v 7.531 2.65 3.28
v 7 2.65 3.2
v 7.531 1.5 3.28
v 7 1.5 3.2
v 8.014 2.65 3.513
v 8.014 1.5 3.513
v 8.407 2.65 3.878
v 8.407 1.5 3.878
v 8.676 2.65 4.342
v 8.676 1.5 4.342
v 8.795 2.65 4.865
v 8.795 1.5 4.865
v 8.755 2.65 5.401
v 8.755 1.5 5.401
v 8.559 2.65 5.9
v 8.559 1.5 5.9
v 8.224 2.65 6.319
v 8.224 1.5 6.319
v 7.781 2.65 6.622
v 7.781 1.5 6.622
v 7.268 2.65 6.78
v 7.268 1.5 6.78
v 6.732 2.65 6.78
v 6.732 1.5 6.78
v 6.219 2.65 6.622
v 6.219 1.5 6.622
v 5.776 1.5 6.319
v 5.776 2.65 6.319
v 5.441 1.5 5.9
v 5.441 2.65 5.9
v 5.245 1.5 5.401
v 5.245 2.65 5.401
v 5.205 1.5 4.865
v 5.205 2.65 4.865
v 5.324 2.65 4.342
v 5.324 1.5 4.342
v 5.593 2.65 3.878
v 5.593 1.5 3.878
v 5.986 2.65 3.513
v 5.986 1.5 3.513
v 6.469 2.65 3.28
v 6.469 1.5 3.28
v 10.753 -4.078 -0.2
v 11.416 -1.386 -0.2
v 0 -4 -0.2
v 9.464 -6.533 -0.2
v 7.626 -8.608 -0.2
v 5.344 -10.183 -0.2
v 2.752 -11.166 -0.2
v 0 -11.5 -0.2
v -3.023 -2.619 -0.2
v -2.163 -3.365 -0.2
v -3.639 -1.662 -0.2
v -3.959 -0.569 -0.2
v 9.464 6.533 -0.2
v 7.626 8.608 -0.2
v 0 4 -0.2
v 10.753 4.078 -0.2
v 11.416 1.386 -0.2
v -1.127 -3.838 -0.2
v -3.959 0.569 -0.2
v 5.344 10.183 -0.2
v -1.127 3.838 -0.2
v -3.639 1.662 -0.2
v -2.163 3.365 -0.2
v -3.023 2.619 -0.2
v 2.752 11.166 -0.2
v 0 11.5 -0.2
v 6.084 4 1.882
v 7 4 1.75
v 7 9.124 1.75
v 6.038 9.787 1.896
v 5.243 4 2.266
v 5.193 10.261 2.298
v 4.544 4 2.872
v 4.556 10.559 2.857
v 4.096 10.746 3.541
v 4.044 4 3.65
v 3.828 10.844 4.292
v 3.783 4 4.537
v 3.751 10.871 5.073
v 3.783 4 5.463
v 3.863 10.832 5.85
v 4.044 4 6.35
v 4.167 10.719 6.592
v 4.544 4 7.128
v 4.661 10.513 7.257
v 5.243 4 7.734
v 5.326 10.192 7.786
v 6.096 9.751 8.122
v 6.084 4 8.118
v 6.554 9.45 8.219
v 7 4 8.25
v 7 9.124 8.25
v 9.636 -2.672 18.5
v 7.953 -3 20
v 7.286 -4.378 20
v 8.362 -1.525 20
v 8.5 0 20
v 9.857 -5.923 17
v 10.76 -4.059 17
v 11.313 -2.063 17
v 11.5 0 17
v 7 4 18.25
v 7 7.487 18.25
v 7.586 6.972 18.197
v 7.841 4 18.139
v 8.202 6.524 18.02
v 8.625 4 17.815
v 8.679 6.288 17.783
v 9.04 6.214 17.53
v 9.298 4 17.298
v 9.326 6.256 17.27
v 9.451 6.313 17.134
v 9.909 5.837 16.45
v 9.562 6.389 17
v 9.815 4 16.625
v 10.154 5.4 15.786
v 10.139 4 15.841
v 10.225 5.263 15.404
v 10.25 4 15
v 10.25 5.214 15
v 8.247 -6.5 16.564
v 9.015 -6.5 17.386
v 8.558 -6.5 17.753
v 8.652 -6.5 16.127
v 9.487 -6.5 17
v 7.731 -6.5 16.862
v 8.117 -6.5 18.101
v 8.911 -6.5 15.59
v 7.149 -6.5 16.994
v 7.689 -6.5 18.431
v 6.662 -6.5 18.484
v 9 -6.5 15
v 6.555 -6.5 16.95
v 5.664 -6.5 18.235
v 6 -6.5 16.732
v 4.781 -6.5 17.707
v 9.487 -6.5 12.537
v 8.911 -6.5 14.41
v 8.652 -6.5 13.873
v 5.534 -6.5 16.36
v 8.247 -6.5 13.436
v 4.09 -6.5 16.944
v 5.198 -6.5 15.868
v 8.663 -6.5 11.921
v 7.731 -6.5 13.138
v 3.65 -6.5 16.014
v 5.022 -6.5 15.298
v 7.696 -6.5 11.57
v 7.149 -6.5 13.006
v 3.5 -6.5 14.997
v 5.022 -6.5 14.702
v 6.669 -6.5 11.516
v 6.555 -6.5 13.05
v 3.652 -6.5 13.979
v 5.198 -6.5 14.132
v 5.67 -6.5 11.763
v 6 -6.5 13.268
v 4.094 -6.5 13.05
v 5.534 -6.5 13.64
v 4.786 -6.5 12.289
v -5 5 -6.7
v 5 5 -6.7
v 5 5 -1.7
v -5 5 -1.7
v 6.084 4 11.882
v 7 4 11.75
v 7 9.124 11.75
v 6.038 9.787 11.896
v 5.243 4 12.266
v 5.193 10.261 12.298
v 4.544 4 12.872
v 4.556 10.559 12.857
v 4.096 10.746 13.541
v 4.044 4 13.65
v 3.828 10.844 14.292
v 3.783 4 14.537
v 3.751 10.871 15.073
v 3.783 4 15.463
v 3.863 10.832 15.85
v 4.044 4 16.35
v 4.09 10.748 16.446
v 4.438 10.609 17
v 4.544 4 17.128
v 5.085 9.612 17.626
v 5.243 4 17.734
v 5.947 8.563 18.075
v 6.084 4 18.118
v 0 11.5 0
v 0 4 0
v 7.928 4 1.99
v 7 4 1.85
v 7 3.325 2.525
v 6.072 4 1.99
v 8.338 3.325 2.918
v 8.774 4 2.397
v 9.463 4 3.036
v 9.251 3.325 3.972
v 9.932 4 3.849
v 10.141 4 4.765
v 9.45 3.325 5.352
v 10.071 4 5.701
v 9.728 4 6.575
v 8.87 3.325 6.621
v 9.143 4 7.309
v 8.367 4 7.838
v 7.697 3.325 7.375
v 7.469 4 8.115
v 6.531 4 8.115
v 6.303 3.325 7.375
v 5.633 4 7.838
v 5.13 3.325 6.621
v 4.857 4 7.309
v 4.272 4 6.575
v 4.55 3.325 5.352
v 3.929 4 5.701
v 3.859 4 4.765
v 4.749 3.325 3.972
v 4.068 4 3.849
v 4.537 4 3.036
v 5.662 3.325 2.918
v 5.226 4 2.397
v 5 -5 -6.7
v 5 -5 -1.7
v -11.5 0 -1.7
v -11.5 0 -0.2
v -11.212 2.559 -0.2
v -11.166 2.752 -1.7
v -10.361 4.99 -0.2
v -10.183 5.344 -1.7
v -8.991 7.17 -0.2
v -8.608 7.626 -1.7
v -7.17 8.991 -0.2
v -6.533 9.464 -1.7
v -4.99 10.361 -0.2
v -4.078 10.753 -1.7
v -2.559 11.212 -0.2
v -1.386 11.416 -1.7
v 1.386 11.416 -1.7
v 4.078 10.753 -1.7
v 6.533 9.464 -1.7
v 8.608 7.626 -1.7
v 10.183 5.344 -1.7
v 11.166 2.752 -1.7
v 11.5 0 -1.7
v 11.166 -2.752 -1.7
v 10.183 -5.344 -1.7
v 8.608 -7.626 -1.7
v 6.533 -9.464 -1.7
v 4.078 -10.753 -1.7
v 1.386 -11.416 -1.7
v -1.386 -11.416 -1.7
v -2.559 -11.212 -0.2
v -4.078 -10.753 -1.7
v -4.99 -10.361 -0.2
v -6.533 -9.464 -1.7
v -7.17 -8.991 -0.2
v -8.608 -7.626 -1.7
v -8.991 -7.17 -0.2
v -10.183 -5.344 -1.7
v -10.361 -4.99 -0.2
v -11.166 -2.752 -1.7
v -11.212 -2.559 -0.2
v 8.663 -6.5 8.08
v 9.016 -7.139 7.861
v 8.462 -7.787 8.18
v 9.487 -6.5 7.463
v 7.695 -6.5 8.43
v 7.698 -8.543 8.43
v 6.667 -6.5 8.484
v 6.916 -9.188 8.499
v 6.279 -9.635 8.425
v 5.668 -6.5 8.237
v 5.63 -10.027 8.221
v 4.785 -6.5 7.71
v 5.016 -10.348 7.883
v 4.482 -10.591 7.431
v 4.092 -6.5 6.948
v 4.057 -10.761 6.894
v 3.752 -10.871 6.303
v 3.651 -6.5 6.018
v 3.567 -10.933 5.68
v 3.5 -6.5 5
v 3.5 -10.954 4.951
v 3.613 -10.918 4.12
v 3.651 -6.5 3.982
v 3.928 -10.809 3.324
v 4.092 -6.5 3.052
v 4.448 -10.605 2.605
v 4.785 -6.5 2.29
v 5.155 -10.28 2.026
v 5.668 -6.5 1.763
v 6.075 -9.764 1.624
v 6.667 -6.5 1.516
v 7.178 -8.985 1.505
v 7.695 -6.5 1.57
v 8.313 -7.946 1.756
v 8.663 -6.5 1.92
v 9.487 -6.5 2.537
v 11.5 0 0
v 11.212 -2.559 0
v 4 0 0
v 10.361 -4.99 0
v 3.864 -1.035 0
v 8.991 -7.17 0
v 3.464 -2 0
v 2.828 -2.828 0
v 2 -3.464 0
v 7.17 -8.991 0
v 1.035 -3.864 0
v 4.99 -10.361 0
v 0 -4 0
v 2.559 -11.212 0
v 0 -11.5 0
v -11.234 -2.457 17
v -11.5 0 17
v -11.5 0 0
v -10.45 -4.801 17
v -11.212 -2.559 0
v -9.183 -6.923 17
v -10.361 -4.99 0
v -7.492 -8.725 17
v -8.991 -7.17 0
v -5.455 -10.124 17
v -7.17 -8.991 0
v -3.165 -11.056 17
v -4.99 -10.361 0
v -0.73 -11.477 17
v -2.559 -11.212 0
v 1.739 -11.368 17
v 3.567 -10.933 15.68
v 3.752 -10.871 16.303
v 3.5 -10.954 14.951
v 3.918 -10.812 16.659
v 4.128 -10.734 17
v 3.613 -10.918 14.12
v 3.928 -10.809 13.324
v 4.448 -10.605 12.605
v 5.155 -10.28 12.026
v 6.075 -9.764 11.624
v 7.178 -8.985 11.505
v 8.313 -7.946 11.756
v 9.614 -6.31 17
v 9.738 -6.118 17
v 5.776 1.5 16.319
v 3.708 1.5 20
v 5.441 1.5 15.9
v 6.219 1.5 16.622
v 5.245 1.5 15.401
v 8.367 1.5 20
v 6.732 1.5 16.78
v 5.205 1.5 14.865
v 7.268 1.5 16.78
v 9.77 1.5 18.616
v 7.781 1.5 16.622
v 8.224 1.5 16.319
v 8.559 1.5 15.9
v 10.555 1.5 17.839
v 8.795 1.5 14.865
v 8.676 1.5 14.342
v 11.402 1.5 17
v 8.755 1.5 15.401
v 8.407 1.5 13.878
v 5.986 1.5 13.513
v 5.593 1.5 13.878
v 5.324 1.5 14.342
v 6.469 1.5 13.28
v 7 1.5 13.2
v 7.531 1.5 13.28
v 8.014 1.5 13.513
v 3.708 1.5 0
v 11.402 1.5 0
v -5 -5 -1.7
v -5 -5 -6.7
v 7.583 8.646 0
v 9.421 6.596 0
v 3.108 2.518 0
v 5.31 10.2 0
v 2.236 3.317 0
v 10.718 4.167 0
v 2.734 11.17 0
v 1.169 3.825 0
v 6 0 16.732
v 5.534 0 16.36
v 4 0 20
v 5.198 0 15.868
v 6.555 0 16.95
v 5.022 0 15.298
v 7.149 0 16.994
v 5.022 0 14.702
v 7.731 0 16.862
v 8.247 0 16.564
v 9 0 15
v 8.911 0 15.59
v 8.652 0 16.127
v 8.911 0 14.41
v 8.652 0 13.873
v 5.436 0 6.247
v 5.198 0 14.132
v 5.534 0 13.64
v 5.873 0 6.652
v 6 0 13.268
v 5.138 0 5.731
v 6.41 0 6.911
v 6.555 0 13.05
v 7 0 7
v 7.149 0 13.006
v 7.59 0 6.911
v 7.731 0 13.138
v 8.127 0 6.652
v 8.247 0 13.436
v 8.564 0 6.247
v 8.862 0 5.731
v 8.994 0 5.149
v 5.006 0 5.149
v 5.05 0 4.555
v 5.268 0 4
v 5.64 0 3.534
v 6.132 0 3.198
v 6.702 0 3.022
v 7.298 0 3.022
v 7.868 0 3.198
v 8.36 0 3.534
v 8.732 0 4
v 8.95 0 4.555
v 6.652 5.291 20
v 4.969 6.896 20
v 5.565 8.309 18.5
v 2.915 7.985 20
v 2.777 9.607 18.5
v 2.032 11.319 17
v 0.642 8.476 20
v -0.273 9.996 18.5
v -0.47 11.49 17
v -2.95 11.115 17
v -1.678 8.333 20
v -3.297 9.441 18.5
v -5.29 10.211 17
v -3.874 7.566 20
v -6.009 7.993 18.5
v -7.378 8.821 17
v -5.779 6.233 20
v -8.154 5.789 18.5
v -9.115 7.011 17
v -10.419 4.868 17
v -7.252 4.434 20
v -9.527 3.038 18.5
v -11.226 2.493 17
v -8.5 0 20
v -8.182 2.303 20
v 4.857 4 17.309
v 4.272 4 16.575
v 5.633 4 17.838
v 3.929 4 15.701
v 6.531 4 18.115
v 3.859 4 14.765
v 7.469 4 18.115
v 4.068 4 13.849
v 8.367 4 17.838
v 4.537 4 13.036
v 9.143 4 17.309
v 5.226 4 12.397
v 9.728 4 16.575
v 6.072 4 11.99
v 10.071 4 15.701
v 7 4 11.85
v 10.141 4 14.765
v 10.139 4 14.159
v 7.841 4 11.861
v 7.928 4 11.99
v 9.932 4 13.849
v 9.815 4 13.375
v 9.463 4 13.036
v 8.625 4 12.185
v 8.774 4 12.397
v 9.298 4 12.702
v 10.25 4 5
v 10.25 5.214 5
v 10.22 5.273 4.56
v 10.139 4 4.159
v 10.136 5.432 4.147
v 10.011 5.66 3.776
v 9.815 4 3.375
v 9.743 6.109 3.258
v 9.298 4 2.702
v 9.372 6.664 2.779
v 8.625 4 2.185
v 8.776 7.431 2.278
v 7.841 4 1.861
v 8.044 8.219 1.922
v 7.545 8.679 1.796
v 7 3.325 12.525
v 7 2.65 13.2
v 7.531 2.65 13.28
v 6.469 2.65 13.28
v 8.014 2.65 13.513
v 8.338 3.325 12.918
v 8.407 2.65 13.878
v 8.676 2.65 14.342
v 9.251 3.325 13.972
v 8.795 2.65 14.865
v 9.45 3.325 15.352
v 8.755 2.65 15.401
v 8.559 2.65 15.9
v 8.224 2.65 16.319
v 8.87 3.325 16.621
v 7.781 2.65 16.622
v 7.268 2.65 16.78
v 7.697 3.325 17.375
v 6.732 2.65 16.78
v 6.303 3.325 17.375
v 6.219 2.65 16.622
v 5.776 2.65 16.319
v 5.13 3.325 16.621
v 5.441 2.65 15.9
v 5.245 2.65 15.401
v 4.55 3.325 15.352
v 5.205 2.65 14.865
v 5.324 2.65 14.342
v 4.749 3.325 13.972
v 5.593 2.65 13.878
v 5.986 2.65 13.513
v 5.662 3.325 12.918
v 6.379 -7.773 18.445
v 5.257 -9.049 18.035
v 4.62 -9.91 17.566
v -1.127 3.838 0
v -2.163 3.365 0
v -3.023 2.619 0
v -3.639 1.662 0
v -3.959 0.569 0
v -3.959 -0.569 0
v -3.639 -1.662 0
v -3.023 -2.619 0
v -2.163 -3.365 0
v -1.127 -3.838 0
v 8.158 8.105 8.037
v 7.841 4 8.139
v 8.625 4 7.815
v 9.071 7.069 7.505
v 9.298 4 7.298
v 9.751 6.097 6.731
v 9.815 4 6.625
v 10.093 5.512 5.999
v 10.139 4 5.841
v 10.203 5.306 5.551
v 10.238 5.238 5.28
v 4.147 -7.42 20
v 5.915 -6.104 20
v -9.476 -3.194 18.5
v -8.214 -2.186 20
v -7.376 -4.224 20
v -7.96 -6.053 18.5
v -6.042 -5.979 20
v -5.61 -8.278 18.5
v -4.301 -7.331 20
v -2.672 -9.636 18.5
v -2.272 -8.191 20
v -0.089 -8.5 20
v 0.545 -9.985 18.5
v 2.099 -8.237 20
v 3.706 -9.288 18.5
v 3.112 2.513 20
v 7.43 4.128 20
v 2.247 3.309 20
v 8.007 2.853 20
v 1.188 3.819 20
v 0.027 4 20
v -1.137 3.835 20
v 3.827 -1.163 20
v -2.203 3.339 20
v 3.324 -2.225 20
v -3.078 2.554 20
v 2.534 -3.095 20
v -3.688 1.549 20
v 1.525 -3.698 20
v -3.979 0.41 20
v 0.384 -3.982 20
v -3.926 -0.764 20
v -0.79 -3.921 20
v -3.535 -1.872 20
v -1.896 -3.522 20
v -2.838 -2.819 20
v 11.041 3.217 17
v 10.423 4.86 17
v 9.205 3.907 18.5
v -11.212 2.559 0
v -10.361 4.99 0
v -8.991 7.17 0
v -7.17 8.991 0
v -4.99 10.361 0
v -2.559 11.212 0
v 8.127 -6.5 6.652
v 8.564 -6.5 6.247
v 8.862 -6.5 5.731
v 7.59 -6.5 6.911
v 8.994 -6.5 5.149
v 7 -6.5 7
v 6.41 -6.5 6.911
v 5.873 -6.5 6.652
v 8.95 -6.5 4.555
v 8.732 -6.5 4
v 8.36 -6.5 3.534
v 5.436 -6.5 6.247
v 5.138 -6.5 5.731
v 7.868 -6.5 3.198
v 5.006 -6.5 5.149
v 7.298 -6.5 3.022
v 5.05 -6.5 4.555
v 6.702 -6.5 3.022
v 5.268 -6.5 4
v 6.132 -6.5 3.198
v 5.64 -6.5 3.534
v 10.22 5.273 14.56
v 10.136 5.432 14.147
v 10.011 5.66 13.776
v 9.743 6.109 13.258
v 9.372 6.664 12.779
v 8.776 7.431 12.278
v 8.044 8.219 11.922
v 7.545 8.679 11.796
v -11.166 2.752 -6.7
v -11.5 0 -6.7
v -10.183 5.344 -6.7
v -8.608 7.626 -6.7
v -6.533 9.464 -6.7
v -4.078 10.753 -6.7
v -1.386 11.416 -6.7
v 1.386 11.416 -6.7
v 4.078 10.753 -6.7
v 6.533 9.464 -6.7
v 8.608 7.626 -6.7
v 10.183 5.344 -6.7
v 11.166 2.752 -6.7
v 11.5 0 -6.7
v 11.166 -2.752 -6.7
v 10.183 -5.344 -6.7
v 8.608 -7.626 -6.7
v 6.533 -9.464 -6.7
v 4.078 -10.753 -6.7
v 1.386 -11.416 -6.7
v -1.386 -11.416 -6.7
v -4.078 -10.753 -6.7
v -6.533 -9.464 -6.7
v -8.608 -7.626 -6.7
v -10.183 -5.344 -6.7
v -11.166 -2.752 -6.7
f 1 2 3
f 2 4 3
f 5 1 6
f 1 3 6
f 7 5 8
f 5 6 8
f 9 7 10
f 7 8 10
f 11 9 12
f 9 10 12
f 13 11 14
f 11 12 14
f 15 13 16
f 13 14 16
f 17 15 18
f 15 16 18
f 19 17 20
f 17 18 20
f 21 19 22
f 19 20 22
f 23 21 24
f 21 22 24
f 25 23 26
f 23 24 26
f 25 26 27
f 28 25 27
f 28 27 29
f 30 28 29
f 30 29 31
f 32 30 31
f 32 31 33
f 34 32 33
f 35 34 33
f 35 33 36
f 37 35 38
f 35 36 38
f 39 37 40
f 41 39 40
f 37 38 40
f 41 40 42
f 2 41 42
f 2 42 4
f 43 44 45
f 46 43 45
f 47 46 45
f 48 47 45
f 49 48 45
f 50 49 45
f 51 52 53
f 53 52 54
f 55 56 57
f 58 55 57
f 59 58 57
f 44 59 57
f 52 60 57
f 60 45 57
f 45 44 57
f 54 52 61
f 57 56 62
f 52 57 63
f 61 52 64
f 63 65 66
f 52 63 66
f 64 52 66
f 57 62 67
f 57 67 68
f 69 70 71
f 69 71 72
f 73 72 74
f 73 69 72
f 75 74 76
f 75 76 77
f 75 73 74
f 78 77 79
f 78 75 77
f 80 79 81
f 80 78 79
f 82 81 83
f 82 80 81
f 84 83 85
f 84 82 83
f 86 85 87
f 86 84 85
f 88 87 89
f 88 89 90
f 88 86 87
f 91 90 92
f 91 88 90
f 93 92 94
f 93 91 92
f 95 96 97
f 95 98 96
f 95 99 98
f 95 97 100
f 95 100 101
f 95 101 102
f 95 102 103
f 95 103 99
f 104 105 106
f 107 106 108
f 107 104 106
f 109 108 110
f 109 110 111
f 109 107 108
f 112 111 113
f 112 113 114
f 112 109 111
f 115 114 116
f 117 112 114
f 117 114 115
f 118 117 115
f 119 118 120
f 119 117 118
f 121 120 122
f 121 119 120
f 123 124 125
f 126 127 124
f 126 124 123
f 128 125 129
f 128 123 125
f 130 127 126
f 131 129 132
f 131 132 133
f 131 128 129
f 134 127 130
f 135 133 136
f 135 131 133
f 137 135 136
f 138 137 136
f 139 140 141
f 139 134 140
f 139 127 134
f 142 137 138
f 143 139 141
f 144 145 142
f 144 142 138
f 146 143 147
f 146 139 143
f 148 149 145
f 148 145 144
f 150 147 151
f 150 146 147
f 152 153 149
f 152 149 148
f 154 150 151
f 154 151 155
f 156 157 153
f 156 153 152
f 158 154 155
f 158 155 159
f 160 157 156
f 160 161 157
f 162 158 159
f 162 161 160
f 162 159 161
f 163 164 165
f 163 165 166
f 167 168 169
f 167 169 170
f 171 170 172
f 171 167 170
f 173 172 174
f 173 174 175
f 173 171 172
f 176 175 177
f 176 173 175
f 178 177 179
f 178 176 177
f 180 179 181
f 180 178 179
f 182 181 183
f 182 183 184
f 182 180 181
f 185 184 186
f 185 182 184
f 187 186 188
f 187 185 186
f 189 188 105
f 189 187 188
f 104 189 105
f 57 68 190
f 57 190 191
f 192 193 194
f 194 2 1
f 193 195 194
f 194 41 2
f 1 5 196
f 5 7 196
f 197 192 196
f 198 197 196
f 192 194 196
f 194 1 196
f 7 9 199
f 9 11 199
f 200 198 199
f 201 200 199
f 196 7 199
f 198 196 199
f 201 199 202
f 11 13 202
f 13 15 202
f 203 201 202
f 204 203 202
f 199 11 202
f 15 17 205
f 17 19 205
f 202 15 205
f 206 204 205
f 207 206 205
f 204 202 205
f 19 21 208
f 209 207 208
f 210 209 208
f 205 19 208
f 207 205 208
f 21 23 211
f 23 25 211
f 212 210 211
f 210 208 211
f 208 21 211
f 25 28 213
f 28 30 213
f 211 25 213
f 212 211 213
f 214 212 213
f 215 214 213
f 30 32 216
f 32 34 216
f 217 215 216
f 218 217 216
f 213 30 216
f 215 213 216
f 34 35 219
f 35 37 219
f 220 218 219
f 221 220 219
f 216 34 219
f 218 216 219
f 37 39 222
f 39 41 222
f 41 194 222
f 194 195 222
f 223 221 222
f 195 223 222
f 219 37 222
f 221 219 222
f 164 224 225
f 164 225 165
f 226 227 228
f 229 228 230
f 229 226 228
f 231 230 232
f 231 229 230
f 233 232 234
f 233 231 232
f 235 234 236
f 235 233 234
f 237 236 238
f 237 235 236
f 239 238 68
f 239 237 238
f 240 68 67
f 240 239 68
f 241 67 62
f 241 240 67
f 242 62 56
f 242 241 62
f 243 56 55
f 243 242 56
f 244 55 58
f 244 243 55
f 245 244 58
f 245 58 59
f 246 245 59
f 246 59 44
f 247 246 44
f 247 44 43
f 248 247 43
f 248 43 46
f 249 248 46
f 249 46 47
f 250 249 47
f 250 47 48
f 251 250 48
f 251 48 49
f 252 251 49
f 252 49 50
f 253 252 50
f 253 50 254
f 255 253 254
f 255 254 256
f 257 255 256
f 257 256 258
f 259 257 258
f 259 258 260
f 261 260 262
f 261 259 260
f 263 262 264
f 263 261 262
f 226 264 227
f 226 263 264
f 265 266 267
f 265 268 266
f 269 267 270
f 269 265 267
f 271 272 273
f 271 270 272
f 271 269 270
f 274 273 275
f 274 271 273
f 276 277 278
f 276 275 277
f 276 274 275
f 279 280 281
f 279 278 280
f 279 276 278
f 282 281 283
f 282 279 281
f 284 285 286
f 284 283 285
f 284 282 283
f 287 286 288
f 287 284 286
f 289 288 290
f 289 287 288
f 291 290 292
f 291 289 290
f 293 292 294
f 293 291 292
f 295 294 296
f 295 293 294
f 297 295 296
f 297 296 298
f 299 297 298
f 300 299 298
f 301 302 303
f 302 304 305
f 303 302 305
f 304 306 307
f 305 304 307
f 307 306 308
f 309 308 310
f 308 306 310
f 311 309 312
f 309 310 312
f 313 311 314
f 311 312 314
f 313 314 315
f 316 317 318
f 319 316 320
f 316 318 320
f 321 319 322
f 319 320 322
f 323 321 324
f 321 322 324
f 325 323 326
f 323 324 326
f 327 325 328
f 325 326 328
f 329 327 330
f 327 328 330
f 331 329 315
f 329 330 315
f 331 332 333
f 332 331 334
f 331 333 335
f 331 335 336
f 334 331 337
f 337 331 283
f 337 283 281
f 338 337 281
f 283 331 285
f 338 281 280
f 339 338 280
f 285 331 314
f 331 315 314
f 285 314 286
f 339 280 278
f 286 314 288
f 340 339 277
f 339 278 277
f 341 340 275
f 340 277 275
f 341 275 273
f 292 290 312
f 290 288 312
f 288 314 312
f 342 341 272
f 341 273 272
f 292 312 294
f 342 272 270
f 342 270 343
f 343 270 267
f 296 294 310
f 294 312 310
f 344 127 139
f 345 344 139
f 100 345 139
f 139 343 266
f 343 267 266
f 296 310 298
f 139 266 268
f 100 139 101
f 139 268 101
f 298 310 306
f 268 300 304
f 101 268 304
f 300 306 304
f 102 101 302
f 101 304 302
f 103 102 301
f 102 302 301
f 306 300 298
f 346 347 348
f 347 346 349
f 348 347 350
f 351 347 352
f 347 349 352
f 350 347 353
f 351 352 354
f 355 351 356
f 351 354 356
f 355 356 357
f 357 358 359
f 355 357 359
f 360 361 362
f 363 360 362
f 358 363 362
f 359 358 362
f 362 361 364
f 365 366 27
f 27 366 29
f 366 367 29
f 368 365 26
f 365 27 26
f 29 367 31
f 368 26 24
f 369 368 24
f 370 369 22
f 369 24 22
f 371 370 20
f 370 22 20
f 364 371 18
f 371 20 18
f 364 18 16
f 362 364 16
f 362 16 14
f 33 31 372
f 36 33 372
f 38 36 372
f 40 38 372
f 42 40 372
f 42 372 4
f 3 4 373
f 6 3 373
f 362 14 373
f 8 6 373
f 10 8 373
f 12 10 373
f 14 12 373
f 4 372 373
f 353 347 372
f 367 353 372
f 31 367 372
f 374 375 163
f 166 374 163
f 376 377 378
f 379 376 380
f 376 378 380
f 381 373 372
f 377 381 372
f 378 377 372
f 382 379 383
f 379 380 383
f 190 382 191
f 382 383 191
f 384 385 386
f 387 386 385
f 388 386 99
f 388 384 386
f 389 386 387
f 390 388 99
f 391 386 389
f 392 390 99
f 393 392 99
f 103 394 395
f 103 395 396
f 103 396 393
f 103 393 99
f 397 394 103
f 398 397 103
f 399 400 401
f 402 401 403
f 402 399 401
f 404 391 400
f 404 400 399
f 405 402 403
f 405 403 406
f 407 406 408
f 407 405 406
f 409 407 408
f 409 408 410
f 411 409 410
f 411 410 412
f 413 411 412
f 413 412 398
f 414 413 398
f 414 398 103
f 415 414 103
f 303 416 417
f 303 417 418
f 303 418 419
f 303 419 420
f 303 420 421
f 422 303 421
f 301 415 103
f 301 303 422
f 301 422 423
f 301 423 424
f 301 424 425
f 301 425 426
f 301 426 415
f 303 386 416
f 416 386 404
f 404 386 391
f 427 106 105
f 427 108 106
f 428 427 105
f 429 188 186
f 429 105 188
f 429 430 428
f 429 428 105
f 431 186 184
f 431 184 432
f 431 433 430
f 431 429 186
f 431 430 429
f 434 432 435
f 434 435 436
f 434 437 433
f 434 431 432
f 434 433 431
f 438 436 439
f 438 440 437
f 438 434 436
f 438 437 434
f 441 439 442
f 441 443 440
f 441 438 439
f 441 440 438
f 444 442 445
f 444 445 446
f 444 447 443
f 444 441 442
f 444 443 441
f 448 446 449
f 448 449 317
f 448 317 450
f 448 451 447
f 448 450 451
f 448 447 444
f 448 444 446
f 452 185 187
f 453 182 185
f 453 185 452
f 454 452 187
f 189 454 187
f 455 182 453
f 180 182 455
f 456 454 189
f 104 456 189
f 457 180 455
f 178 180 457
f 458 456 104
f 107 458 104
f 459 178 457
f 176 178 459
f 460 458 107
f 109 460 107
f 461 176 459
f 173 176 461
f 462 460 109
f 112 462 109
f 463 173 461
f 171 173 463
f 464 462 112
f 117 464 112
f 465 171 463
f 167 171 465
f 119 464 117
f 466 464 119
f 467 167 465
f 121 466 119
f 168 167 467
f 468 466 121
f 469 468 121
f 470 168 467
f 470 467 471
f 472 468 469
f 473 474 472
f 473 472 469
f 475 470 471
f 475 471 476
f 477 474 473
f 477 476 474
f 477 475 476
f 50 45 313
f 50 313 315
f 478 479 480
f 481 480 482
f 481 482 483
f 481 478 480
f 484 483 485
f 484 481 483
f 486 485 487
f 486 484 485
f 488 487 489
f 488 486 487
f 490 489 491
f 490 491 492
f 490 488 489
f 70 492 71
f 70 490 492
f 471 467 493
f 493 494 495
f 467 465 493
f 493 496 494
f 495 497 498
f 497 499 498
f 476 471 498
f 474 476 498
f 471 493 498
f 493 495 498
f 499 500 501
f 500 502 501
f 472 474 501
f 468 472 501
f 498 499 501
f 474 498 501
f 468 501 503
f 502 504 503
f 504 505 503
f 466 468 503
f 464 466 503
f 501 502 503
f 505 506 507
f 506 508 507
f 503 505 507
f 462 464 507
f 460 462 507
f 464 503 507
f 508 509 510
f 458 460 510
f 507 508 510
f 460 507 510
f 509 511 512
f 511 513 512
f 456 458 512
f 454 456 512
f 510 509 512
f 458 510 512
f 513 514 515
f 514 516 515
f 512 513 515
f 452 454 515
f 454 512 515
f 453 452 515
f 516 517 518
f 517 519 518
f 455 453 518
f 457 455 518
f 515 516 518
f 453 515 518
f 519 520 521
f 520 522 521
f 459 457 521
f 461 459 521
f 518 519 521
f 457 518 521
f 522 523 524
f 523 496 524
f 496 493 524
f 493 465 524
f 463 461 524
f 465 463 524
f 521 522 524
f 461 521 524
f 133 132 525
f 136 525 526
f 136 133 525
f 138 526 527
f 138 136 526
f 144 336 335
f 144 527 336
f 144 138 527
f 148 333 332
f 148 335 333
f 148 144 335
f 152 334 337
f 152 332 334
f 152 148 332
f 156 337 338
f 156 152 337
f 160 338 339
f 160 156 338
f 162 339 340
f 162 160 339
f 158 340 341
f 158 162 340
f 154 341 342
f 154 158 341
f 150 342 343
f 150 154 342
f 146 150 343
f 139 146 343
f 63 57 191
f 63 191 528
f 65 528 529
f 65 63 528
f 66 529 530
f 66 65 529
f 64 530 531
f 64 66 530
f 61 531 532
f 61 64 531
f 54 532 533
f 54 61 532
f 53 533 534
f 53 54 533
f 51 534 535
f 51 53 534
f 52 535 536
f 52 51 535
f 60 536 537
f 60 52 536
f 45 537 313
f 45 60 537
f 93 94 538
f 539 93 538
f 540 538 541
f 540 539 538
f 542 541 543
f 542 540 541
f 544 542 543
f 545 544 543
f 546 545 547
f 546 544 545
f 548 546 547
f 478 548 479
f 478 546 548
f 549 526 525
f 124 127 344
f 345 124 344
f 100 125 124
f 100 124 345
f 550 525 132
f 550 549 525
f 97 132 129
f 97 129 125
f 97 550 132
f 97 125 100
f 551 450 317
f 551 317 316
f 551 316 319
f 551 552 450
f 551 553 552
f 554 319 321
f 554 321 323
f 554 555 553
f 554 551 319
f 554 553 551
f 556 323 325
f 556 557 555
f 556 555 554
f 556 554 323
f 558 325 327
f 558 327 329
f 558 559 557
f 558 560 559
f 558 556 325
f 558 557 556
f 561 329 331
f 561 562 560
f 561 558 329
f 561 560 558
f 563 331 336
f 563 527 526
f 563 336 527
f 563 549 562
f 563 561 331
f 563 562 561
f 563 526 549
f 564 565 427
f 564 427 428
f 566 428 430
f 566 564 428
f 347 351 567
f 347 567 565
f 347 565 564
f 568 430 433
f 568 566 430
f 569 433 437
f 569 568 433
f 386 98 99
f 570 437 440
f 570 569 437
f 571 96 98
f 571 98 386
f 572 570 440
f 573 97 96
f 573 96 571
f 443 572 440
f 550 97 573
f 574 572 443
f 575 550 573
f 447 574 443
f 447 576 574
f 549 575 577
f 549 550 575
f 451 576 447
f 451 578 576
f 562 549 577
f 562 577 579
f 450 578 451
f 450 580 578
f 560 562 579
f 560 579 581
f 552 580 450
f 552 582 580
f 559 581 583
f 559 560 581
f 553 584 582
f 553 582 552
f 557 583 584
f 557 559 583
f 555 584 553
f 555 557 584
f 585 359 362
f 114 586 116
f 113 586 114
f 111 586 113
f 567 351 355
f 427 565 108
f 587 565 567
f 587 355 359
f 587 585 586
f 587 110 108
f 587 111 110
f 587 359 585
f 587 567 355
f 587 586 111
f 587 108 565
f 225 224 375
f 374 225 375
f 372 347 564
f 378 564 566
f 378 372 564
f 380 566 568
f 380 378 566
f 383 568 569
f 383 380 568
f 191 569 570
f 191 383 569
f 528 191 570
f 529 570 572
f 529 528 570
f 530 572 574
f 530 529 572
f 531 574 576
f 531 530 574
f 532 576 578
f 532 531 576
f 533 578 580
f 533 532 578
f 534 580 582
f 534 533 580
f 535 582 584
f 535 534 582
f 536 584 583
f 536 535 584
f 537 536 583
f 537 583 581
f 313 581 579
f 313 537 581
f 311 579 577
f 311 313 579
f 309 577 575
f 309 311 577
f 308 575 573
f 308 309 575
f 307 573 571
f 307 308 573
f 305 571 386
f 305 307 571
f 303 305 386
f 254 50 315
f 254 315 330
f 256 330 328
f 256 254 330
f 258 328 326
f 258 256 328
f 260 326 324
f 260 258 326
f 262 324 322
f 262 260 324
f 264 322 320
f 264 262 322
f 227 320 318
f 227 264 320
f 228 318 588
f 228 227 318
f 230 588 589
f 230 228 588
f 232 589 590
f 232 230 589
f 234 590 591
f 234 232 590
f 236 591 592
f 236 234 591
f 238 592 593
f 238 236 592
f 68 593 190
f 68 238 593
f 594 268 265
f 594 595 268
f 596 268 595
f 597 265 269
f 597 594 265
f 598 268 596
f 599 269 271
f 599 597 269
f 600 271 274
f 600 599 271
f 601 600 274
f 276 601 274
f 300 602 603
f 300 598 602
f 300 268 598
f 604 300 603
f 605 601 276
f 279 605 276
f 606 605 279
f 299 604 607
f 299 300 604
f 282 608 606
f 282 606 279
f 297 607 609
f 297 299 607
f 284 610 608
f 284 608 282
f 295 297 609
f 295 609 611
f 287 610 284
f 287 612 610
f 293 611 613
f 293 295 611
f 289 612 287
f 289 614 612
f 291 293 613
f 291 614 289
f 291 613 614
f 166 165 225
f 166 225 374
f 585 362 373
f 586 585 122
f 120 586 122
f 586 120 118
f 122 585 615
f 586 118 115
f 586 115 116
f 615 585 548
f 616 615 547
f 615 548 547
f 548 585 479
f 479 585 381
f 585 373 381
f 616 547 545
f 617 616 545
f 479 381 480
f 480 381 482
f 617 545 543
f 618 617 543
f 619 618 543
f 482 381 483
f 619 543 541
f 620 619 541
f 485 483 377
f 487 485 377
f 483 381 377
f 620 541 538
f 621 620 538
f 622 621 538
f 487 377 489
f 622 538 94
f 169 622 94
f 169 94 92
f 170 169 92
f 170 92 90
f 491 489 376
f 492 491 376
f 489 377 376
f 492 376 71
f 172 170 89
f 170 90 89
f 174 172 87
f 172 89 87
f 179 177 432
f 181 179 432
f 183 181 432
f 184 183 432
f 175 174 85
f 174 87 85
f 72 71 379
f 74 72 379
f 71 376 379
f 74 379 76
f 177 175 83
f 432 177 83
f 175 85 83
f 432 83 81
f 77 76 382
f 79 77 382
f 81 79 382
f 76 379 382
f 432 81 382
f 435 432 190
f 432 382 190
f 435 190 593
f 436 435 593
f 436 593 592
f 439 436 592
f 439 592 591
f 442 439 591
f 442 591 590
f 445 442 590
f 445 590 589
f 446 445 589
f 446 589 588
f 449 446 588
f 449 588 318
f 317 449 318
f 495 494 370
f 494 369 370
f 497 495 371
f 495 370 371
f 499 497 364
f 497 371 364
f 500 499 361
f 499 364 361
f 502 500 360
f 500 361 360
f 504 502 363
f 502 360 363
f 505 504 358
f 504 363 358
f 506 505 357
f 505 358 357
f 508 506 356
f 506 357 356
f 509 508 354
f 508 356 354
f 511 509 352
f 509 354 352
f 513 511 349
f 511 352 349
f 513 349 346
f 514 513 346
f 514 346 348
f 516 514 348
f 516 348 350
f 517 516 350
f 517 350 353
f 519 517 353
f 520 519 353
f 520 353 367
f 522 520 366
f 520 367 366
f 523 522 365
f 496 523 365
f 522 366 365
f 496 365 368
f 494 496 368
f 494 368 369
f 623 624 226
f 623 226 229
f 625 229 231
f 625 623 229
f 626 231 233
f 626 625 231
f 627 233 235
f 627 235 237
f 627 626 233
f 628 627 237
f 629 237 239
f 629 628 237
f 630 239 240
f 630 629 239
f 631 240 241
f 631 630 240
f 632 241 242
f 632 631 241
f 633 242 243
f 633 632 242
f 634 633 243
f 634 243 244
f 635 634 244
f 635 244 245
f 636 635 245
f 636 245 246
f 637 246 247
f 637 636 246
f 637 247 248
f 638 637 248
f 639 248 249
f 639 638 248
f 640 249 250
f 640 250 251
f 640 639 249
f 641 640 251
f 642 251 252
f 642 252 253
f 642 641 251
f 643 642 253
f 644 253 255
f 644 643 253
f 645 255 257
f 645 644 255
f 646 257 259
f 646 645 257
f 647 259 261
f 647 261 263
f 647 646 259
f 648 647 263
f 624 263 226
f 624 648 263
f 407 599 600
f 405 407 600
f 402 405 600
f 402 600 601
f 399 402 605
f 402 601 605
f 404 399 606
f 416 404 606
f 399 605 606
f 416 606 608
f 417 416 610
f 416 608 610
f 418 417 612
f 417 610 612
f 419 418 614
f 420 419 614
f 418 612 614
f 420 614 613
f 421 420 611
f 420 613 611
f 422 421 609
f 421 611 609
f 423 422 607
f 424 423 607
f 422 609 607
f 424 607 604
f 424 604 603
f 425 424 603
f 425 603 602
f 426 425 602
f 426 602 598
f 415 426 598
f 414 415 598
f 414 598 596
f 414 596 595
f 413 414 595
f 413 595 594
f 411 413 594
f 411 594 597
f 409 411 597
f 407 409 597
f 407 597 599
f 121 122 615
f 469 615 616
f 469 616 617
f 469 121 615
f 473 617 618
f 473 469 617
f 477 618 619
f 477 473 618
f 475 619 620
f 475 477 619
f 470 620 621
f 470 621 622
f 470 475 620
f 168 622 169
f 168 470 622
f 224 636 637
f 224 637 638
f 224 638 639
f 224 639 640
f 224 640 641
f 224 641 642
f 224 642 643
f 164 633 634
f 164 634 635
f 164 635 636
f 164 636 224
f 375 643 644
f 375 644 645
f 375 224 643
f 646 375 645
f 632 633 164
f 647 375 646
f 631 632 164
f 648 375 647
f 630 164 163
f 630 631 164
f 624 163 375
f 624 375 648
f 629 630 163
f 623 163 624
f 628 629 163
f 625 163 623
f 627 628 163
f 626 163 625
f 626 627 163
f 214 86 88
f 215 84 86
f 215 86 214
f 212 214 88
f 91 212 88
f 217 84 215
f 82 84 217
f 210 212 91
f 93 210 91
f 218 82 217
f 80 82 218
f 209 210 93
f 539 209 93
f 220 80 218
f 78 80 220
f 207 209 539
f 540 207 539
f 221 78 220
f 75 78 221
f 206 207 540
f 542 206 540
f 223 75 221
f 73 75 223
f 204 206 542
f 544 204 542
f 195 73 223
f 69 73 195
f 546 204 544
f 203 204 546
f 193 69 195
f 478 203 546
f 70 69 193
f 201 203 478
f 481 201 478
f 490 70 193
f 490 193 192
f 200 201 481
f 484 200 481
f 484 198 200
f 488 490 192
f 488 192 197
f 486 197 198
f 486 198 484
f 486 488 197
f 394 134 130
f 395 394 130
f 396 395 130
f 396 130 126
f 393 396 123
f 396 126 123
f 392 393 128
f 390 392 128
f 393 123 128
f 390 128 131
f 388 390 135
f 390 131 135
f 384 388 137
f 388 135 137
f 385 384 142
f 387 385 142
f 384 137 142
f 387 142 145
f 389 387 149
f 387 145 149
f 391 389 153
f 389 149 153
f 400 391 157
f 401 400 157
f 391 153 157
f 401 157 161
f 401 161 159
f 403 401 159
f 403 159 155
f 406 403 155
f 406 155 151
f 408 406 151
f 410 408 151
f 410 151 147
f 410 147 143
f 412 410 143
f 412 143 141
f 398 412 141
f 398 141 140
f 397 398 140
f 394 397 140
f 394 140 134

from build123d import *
from build123d.topology import SkipClean

# Parameters (mm, degrees)
SZKIC1_R                                           = 11.5
SZKIC1_R_2                                         = 4
DODANIE_WYCI_GNI_CIE1_DEPTH                        = 20
SZKIC3_W                                           = 11.5
SZKIC3_H                                           = 20
WYTNIJ_WYCI_GNI_CIE1_DEPTH                         = 1.5
WYTNIJ_WYCI_GNI_CIE2_DEPTH                         = 32
POG_BIENIE_STO_KOWE_POD_M3_WKR_T_Z_BEM_D           = 3.6
POG_BIENIE_STO_KOWE_POD_M3_WKR_T_Z_BEM_CSINK_D     = 6.3
POG_BIENIE_STO_KOWE_POD_M3_WKR_T_Z_BEM_CSINK_ANGLE = 90
SZKIC7_R                                           = 3.5
WYTNIJ_WYCI_GNI_CIE3_DEPTH                         = 32
SZKIC8_R                                           = 2
WYTNIJ_WYCI_GNI_CIE4_DEPTH                         = 7
DODANIE_WYCI_GNI_CIE2_START                        = 0.2
DODANIE_WYCI_GNI_CIE2_DEPTH                        = 0.2
DODANIE_WYCI_GNI_CIE3_START                        = 1.5
SZKIC10_R                                          = 11.5
DODANIE_WYCI_GNI_CIE3_DEPTH                        = 1.5
DODANIE_WYCI_GNI_CIE4_START                        = 5
SZKIC11_R                                          = 11.5
SZKIC11_W                                          = 10
SZKIC11_H                                          = 10
DODANIE_WYCI_GNI_CIE4_DEPTH                        = 5
SFAZOWANIE1_SIZE                                   = 3


with BuildPart() as part:
    # Szkic1 → Dodanie-wyciągnięcie1 (new body)
    with BuildSketch(Plane.XY):
        with Locations(Location((0, 0, 0), (0, 0, 180))):
            Circle(SZKIC1_R)
        with Locations(Location((0, 0, 0), (0, 0, 180))):
            Circle(SZKIC1_R_2, mode=Mode.SUBTRACT)
    extrude(amount=DODANIE_WYCI_GNI_CIE1_DEPTH)

    # Szkic3 → Wytnij-wyciągnięcie1 (cut)
    with BuildSketch(Plane(origin=(0, 0, 0), x_dir=(1, 0, 0), z_dir=(0, 1, 0))):
        with Locations((5.75, -10)):
            Rectangle(SZKIC3_W, SZKIC3_H)
    extrude(amount=WYTNIJ_WYCI_GNI_CIE1_DEPTH, mode=Mode.SUBTRACT)

    # Szkic4 → Wytnij-wyciągnięcie2 (cut)
    with BuildSketch(Plane(origin=(0, 4, 0), x_dir=(1, 0, 0), z_dir=(0, 1, 0))):
        with BuildLine():
            ThreePointArc((7, -11.75), (3.75, -15), (7, -18.25))
            Line((7, -18.25), (7, -11.75))
        make_face()
        with BuildLine():
            Line((7, -11.75), (7, -18.25))
            ThreePointArc((7, -18.25), (9.298097039, -17.298097039), (10.25, -15))
            ThreePointArc((10.25, -15), (9.298097039, -12.701902961), (7, -11.75))
        make_face()
        with BuildLine():
            ThreePointArc((7, -1.75), (3.75, -5), (7, -8.25))
            Line((7, -8.25), (7, -1.75))
        make_face()
        with BuildLine():
            Line((7, -1.75), (7, -8.25))
            ThreePointArc((7, -8.25), (9.298097039, -7.298097039), (10.25, -5))
            ThreePointArc((10.25, -5), (9.298097039, -2.701902961), (7, -1.75))
        make_face()
    extrude(amount=WYTNIJ_WYCI_GNI_CIE2_DEPTH, mode=Mode.SUBTRACT)

    # Pogłębienie stożkowe pod M3 Wkręt z łbem płaskim1 (through all)
    with Locations(Plane(origin=(7, 4, 15), x_dir=(0, 0, 1), z_dir=(0, 1, 0))):
        with Locations((0, 0), (-10, 0)):
            CounterSinkHole(POG_BIENIE_STO_KOWE_POD_M3_WKR_T_Z_BEM_D / 2, POG_BIENIE_STO_KOWE_POD_M3_WKR_T_Z_BEM_CSINK_D / 2, counter_sink_angle=POG_BIENIE_STO_KOWE_POD_M3_WKR_T_Z_BEM_CSINK_ANGLE)

    # Szkic7 → Wytnij-wyciągnięcie3 (cut)
    with BuildSketch(Plane(origin=(0, -6.5, 0), x_dir=(-1, 0, 0), z_dir=(0, -1, 0))):
        with Locations((-7, -5)):
            Circle(SZKIC7_R)
        with Locations((-7, -15)):
            Circle(SZKIC7_R)
    extrude(amount=WYTNIJ_WYCI_GNI_CIE3_DEPTH, mode=Mode.SUBTRACT)

    # Szkic8 → Wytnij-wyciągnięcie4 (cut)
    with BuildSketch(Plane.XZ.offset(6.5)):
        with Locations((7, 15)):
            Circle(SZKIC8_R)
        with Locations(Location((7, 5, 0), (0, 0, 90))):
            Circle(SZKIC8_R)
    extrude(amount=-WYTNIJ_WYCI_GNI_CIE4_DEPTH, mode=Mode.SUBTRACT)

    # Szkic9 → Dodanie-wyciągnięcie2 (add)
    with SkipClean():  # the faces are left unmerged after this step: merging them gives an invalid solid
        with BuildSketch(Plane(origin=(0, 0, 0), x_dir=(-1, 0, 0), z_dir=(0, 0, -1)).offset(DODANIE_WYCI_GNI_CIE2_START)):
            with BuildLine():
                Line((0, 11.5), (0, 4))
                ThreePointArc((0, 4), (4, 0), (0, -4))
                Line((0, -4), (0, -11.5))
                ThreePointArc((0, -11.5), (11.5, 0), (0, 11.5))
            make_face()
        extrude(amount=-DODANIE_WYCI_GNI_CIE2_DEPTH)

    # Szkic10 → Dodanie-wyciągnięcie3 (add)
    with SkipClean():  # the faces are left unmerged after this step: merging them gives an invalid solid
        with BuildSketch(Plane(origin=(0, 0, -0.2), x_dir=(-1, 0, 0), z_dir=(0, 0, -1)).offset(DODANIE_WYCI_GNI_CIE3_START)):
            Circle(SZKIC10_R)
        extrude(amount=-DODANIE_WYCI_GNI_CIE3_DEPTH)

    # Szkic11 → Dodanie-wyciągnięcie4 (add)
    with SkipClean():  # the faces are left unmerged after this step: merging them gives an invalid solid
        with BuildSketch(Plane(origin=(0, 0, -1.7), x_dir=(-1, 0, 0), z_dir=(0, 0, -1)).offset(DODANIE_WYCI_GNI_CIE4_START)):
            Circle(SZKIC11_R)
            Rectangle(SZKIC11_W, SZKIC11_H, mode=Mode.SUBTRACT)
        extrude(amount=-DODANIE_WYCI_GNI_CIE4_DEPTH)

    # Sfazowanie1
    # the kernel refuses this chamfer: 3 mm, written as the material it takes off along each edge
    with BuildSketch(Plane(origin=(0, 0, 20), x_dir=(-1, 0, 0), z_dir=(0, 1, 0))) as sfazowanie1_piece_1:
        Polygon((11.5, -SFAZOWANIE1_SIZE), (11.5 - SFAZOWANIE1_SIZE, 0), (11.5, 0), align=None)
    revolve(axis=Axis((0, 0, 20), (0, 0, 1)), revolution_arc=218.500054596, mode=Mode.SUBTRACT)
    with BuildSketch(Plane(origin=(0, 0, 20), x_dir=(0.8571646812696857, -0.5150424343525863, 0), z_dir=(-0.5150424343525863, -0.8571646812696857, 0))) as sfazowanie1_piece_2:
        Polygon((11.5, -SFAZOWANIE1_SIZE), (11.5 - SFAZOWANIE1_SIZE, 0), (11.5, 0), align=None)
    revolve(axis=Axis((0, 0, 20), (0, 0, 1)), revolution_arc=211.000291399, mode=Mode.SUBTRACT)


solid = part.part
